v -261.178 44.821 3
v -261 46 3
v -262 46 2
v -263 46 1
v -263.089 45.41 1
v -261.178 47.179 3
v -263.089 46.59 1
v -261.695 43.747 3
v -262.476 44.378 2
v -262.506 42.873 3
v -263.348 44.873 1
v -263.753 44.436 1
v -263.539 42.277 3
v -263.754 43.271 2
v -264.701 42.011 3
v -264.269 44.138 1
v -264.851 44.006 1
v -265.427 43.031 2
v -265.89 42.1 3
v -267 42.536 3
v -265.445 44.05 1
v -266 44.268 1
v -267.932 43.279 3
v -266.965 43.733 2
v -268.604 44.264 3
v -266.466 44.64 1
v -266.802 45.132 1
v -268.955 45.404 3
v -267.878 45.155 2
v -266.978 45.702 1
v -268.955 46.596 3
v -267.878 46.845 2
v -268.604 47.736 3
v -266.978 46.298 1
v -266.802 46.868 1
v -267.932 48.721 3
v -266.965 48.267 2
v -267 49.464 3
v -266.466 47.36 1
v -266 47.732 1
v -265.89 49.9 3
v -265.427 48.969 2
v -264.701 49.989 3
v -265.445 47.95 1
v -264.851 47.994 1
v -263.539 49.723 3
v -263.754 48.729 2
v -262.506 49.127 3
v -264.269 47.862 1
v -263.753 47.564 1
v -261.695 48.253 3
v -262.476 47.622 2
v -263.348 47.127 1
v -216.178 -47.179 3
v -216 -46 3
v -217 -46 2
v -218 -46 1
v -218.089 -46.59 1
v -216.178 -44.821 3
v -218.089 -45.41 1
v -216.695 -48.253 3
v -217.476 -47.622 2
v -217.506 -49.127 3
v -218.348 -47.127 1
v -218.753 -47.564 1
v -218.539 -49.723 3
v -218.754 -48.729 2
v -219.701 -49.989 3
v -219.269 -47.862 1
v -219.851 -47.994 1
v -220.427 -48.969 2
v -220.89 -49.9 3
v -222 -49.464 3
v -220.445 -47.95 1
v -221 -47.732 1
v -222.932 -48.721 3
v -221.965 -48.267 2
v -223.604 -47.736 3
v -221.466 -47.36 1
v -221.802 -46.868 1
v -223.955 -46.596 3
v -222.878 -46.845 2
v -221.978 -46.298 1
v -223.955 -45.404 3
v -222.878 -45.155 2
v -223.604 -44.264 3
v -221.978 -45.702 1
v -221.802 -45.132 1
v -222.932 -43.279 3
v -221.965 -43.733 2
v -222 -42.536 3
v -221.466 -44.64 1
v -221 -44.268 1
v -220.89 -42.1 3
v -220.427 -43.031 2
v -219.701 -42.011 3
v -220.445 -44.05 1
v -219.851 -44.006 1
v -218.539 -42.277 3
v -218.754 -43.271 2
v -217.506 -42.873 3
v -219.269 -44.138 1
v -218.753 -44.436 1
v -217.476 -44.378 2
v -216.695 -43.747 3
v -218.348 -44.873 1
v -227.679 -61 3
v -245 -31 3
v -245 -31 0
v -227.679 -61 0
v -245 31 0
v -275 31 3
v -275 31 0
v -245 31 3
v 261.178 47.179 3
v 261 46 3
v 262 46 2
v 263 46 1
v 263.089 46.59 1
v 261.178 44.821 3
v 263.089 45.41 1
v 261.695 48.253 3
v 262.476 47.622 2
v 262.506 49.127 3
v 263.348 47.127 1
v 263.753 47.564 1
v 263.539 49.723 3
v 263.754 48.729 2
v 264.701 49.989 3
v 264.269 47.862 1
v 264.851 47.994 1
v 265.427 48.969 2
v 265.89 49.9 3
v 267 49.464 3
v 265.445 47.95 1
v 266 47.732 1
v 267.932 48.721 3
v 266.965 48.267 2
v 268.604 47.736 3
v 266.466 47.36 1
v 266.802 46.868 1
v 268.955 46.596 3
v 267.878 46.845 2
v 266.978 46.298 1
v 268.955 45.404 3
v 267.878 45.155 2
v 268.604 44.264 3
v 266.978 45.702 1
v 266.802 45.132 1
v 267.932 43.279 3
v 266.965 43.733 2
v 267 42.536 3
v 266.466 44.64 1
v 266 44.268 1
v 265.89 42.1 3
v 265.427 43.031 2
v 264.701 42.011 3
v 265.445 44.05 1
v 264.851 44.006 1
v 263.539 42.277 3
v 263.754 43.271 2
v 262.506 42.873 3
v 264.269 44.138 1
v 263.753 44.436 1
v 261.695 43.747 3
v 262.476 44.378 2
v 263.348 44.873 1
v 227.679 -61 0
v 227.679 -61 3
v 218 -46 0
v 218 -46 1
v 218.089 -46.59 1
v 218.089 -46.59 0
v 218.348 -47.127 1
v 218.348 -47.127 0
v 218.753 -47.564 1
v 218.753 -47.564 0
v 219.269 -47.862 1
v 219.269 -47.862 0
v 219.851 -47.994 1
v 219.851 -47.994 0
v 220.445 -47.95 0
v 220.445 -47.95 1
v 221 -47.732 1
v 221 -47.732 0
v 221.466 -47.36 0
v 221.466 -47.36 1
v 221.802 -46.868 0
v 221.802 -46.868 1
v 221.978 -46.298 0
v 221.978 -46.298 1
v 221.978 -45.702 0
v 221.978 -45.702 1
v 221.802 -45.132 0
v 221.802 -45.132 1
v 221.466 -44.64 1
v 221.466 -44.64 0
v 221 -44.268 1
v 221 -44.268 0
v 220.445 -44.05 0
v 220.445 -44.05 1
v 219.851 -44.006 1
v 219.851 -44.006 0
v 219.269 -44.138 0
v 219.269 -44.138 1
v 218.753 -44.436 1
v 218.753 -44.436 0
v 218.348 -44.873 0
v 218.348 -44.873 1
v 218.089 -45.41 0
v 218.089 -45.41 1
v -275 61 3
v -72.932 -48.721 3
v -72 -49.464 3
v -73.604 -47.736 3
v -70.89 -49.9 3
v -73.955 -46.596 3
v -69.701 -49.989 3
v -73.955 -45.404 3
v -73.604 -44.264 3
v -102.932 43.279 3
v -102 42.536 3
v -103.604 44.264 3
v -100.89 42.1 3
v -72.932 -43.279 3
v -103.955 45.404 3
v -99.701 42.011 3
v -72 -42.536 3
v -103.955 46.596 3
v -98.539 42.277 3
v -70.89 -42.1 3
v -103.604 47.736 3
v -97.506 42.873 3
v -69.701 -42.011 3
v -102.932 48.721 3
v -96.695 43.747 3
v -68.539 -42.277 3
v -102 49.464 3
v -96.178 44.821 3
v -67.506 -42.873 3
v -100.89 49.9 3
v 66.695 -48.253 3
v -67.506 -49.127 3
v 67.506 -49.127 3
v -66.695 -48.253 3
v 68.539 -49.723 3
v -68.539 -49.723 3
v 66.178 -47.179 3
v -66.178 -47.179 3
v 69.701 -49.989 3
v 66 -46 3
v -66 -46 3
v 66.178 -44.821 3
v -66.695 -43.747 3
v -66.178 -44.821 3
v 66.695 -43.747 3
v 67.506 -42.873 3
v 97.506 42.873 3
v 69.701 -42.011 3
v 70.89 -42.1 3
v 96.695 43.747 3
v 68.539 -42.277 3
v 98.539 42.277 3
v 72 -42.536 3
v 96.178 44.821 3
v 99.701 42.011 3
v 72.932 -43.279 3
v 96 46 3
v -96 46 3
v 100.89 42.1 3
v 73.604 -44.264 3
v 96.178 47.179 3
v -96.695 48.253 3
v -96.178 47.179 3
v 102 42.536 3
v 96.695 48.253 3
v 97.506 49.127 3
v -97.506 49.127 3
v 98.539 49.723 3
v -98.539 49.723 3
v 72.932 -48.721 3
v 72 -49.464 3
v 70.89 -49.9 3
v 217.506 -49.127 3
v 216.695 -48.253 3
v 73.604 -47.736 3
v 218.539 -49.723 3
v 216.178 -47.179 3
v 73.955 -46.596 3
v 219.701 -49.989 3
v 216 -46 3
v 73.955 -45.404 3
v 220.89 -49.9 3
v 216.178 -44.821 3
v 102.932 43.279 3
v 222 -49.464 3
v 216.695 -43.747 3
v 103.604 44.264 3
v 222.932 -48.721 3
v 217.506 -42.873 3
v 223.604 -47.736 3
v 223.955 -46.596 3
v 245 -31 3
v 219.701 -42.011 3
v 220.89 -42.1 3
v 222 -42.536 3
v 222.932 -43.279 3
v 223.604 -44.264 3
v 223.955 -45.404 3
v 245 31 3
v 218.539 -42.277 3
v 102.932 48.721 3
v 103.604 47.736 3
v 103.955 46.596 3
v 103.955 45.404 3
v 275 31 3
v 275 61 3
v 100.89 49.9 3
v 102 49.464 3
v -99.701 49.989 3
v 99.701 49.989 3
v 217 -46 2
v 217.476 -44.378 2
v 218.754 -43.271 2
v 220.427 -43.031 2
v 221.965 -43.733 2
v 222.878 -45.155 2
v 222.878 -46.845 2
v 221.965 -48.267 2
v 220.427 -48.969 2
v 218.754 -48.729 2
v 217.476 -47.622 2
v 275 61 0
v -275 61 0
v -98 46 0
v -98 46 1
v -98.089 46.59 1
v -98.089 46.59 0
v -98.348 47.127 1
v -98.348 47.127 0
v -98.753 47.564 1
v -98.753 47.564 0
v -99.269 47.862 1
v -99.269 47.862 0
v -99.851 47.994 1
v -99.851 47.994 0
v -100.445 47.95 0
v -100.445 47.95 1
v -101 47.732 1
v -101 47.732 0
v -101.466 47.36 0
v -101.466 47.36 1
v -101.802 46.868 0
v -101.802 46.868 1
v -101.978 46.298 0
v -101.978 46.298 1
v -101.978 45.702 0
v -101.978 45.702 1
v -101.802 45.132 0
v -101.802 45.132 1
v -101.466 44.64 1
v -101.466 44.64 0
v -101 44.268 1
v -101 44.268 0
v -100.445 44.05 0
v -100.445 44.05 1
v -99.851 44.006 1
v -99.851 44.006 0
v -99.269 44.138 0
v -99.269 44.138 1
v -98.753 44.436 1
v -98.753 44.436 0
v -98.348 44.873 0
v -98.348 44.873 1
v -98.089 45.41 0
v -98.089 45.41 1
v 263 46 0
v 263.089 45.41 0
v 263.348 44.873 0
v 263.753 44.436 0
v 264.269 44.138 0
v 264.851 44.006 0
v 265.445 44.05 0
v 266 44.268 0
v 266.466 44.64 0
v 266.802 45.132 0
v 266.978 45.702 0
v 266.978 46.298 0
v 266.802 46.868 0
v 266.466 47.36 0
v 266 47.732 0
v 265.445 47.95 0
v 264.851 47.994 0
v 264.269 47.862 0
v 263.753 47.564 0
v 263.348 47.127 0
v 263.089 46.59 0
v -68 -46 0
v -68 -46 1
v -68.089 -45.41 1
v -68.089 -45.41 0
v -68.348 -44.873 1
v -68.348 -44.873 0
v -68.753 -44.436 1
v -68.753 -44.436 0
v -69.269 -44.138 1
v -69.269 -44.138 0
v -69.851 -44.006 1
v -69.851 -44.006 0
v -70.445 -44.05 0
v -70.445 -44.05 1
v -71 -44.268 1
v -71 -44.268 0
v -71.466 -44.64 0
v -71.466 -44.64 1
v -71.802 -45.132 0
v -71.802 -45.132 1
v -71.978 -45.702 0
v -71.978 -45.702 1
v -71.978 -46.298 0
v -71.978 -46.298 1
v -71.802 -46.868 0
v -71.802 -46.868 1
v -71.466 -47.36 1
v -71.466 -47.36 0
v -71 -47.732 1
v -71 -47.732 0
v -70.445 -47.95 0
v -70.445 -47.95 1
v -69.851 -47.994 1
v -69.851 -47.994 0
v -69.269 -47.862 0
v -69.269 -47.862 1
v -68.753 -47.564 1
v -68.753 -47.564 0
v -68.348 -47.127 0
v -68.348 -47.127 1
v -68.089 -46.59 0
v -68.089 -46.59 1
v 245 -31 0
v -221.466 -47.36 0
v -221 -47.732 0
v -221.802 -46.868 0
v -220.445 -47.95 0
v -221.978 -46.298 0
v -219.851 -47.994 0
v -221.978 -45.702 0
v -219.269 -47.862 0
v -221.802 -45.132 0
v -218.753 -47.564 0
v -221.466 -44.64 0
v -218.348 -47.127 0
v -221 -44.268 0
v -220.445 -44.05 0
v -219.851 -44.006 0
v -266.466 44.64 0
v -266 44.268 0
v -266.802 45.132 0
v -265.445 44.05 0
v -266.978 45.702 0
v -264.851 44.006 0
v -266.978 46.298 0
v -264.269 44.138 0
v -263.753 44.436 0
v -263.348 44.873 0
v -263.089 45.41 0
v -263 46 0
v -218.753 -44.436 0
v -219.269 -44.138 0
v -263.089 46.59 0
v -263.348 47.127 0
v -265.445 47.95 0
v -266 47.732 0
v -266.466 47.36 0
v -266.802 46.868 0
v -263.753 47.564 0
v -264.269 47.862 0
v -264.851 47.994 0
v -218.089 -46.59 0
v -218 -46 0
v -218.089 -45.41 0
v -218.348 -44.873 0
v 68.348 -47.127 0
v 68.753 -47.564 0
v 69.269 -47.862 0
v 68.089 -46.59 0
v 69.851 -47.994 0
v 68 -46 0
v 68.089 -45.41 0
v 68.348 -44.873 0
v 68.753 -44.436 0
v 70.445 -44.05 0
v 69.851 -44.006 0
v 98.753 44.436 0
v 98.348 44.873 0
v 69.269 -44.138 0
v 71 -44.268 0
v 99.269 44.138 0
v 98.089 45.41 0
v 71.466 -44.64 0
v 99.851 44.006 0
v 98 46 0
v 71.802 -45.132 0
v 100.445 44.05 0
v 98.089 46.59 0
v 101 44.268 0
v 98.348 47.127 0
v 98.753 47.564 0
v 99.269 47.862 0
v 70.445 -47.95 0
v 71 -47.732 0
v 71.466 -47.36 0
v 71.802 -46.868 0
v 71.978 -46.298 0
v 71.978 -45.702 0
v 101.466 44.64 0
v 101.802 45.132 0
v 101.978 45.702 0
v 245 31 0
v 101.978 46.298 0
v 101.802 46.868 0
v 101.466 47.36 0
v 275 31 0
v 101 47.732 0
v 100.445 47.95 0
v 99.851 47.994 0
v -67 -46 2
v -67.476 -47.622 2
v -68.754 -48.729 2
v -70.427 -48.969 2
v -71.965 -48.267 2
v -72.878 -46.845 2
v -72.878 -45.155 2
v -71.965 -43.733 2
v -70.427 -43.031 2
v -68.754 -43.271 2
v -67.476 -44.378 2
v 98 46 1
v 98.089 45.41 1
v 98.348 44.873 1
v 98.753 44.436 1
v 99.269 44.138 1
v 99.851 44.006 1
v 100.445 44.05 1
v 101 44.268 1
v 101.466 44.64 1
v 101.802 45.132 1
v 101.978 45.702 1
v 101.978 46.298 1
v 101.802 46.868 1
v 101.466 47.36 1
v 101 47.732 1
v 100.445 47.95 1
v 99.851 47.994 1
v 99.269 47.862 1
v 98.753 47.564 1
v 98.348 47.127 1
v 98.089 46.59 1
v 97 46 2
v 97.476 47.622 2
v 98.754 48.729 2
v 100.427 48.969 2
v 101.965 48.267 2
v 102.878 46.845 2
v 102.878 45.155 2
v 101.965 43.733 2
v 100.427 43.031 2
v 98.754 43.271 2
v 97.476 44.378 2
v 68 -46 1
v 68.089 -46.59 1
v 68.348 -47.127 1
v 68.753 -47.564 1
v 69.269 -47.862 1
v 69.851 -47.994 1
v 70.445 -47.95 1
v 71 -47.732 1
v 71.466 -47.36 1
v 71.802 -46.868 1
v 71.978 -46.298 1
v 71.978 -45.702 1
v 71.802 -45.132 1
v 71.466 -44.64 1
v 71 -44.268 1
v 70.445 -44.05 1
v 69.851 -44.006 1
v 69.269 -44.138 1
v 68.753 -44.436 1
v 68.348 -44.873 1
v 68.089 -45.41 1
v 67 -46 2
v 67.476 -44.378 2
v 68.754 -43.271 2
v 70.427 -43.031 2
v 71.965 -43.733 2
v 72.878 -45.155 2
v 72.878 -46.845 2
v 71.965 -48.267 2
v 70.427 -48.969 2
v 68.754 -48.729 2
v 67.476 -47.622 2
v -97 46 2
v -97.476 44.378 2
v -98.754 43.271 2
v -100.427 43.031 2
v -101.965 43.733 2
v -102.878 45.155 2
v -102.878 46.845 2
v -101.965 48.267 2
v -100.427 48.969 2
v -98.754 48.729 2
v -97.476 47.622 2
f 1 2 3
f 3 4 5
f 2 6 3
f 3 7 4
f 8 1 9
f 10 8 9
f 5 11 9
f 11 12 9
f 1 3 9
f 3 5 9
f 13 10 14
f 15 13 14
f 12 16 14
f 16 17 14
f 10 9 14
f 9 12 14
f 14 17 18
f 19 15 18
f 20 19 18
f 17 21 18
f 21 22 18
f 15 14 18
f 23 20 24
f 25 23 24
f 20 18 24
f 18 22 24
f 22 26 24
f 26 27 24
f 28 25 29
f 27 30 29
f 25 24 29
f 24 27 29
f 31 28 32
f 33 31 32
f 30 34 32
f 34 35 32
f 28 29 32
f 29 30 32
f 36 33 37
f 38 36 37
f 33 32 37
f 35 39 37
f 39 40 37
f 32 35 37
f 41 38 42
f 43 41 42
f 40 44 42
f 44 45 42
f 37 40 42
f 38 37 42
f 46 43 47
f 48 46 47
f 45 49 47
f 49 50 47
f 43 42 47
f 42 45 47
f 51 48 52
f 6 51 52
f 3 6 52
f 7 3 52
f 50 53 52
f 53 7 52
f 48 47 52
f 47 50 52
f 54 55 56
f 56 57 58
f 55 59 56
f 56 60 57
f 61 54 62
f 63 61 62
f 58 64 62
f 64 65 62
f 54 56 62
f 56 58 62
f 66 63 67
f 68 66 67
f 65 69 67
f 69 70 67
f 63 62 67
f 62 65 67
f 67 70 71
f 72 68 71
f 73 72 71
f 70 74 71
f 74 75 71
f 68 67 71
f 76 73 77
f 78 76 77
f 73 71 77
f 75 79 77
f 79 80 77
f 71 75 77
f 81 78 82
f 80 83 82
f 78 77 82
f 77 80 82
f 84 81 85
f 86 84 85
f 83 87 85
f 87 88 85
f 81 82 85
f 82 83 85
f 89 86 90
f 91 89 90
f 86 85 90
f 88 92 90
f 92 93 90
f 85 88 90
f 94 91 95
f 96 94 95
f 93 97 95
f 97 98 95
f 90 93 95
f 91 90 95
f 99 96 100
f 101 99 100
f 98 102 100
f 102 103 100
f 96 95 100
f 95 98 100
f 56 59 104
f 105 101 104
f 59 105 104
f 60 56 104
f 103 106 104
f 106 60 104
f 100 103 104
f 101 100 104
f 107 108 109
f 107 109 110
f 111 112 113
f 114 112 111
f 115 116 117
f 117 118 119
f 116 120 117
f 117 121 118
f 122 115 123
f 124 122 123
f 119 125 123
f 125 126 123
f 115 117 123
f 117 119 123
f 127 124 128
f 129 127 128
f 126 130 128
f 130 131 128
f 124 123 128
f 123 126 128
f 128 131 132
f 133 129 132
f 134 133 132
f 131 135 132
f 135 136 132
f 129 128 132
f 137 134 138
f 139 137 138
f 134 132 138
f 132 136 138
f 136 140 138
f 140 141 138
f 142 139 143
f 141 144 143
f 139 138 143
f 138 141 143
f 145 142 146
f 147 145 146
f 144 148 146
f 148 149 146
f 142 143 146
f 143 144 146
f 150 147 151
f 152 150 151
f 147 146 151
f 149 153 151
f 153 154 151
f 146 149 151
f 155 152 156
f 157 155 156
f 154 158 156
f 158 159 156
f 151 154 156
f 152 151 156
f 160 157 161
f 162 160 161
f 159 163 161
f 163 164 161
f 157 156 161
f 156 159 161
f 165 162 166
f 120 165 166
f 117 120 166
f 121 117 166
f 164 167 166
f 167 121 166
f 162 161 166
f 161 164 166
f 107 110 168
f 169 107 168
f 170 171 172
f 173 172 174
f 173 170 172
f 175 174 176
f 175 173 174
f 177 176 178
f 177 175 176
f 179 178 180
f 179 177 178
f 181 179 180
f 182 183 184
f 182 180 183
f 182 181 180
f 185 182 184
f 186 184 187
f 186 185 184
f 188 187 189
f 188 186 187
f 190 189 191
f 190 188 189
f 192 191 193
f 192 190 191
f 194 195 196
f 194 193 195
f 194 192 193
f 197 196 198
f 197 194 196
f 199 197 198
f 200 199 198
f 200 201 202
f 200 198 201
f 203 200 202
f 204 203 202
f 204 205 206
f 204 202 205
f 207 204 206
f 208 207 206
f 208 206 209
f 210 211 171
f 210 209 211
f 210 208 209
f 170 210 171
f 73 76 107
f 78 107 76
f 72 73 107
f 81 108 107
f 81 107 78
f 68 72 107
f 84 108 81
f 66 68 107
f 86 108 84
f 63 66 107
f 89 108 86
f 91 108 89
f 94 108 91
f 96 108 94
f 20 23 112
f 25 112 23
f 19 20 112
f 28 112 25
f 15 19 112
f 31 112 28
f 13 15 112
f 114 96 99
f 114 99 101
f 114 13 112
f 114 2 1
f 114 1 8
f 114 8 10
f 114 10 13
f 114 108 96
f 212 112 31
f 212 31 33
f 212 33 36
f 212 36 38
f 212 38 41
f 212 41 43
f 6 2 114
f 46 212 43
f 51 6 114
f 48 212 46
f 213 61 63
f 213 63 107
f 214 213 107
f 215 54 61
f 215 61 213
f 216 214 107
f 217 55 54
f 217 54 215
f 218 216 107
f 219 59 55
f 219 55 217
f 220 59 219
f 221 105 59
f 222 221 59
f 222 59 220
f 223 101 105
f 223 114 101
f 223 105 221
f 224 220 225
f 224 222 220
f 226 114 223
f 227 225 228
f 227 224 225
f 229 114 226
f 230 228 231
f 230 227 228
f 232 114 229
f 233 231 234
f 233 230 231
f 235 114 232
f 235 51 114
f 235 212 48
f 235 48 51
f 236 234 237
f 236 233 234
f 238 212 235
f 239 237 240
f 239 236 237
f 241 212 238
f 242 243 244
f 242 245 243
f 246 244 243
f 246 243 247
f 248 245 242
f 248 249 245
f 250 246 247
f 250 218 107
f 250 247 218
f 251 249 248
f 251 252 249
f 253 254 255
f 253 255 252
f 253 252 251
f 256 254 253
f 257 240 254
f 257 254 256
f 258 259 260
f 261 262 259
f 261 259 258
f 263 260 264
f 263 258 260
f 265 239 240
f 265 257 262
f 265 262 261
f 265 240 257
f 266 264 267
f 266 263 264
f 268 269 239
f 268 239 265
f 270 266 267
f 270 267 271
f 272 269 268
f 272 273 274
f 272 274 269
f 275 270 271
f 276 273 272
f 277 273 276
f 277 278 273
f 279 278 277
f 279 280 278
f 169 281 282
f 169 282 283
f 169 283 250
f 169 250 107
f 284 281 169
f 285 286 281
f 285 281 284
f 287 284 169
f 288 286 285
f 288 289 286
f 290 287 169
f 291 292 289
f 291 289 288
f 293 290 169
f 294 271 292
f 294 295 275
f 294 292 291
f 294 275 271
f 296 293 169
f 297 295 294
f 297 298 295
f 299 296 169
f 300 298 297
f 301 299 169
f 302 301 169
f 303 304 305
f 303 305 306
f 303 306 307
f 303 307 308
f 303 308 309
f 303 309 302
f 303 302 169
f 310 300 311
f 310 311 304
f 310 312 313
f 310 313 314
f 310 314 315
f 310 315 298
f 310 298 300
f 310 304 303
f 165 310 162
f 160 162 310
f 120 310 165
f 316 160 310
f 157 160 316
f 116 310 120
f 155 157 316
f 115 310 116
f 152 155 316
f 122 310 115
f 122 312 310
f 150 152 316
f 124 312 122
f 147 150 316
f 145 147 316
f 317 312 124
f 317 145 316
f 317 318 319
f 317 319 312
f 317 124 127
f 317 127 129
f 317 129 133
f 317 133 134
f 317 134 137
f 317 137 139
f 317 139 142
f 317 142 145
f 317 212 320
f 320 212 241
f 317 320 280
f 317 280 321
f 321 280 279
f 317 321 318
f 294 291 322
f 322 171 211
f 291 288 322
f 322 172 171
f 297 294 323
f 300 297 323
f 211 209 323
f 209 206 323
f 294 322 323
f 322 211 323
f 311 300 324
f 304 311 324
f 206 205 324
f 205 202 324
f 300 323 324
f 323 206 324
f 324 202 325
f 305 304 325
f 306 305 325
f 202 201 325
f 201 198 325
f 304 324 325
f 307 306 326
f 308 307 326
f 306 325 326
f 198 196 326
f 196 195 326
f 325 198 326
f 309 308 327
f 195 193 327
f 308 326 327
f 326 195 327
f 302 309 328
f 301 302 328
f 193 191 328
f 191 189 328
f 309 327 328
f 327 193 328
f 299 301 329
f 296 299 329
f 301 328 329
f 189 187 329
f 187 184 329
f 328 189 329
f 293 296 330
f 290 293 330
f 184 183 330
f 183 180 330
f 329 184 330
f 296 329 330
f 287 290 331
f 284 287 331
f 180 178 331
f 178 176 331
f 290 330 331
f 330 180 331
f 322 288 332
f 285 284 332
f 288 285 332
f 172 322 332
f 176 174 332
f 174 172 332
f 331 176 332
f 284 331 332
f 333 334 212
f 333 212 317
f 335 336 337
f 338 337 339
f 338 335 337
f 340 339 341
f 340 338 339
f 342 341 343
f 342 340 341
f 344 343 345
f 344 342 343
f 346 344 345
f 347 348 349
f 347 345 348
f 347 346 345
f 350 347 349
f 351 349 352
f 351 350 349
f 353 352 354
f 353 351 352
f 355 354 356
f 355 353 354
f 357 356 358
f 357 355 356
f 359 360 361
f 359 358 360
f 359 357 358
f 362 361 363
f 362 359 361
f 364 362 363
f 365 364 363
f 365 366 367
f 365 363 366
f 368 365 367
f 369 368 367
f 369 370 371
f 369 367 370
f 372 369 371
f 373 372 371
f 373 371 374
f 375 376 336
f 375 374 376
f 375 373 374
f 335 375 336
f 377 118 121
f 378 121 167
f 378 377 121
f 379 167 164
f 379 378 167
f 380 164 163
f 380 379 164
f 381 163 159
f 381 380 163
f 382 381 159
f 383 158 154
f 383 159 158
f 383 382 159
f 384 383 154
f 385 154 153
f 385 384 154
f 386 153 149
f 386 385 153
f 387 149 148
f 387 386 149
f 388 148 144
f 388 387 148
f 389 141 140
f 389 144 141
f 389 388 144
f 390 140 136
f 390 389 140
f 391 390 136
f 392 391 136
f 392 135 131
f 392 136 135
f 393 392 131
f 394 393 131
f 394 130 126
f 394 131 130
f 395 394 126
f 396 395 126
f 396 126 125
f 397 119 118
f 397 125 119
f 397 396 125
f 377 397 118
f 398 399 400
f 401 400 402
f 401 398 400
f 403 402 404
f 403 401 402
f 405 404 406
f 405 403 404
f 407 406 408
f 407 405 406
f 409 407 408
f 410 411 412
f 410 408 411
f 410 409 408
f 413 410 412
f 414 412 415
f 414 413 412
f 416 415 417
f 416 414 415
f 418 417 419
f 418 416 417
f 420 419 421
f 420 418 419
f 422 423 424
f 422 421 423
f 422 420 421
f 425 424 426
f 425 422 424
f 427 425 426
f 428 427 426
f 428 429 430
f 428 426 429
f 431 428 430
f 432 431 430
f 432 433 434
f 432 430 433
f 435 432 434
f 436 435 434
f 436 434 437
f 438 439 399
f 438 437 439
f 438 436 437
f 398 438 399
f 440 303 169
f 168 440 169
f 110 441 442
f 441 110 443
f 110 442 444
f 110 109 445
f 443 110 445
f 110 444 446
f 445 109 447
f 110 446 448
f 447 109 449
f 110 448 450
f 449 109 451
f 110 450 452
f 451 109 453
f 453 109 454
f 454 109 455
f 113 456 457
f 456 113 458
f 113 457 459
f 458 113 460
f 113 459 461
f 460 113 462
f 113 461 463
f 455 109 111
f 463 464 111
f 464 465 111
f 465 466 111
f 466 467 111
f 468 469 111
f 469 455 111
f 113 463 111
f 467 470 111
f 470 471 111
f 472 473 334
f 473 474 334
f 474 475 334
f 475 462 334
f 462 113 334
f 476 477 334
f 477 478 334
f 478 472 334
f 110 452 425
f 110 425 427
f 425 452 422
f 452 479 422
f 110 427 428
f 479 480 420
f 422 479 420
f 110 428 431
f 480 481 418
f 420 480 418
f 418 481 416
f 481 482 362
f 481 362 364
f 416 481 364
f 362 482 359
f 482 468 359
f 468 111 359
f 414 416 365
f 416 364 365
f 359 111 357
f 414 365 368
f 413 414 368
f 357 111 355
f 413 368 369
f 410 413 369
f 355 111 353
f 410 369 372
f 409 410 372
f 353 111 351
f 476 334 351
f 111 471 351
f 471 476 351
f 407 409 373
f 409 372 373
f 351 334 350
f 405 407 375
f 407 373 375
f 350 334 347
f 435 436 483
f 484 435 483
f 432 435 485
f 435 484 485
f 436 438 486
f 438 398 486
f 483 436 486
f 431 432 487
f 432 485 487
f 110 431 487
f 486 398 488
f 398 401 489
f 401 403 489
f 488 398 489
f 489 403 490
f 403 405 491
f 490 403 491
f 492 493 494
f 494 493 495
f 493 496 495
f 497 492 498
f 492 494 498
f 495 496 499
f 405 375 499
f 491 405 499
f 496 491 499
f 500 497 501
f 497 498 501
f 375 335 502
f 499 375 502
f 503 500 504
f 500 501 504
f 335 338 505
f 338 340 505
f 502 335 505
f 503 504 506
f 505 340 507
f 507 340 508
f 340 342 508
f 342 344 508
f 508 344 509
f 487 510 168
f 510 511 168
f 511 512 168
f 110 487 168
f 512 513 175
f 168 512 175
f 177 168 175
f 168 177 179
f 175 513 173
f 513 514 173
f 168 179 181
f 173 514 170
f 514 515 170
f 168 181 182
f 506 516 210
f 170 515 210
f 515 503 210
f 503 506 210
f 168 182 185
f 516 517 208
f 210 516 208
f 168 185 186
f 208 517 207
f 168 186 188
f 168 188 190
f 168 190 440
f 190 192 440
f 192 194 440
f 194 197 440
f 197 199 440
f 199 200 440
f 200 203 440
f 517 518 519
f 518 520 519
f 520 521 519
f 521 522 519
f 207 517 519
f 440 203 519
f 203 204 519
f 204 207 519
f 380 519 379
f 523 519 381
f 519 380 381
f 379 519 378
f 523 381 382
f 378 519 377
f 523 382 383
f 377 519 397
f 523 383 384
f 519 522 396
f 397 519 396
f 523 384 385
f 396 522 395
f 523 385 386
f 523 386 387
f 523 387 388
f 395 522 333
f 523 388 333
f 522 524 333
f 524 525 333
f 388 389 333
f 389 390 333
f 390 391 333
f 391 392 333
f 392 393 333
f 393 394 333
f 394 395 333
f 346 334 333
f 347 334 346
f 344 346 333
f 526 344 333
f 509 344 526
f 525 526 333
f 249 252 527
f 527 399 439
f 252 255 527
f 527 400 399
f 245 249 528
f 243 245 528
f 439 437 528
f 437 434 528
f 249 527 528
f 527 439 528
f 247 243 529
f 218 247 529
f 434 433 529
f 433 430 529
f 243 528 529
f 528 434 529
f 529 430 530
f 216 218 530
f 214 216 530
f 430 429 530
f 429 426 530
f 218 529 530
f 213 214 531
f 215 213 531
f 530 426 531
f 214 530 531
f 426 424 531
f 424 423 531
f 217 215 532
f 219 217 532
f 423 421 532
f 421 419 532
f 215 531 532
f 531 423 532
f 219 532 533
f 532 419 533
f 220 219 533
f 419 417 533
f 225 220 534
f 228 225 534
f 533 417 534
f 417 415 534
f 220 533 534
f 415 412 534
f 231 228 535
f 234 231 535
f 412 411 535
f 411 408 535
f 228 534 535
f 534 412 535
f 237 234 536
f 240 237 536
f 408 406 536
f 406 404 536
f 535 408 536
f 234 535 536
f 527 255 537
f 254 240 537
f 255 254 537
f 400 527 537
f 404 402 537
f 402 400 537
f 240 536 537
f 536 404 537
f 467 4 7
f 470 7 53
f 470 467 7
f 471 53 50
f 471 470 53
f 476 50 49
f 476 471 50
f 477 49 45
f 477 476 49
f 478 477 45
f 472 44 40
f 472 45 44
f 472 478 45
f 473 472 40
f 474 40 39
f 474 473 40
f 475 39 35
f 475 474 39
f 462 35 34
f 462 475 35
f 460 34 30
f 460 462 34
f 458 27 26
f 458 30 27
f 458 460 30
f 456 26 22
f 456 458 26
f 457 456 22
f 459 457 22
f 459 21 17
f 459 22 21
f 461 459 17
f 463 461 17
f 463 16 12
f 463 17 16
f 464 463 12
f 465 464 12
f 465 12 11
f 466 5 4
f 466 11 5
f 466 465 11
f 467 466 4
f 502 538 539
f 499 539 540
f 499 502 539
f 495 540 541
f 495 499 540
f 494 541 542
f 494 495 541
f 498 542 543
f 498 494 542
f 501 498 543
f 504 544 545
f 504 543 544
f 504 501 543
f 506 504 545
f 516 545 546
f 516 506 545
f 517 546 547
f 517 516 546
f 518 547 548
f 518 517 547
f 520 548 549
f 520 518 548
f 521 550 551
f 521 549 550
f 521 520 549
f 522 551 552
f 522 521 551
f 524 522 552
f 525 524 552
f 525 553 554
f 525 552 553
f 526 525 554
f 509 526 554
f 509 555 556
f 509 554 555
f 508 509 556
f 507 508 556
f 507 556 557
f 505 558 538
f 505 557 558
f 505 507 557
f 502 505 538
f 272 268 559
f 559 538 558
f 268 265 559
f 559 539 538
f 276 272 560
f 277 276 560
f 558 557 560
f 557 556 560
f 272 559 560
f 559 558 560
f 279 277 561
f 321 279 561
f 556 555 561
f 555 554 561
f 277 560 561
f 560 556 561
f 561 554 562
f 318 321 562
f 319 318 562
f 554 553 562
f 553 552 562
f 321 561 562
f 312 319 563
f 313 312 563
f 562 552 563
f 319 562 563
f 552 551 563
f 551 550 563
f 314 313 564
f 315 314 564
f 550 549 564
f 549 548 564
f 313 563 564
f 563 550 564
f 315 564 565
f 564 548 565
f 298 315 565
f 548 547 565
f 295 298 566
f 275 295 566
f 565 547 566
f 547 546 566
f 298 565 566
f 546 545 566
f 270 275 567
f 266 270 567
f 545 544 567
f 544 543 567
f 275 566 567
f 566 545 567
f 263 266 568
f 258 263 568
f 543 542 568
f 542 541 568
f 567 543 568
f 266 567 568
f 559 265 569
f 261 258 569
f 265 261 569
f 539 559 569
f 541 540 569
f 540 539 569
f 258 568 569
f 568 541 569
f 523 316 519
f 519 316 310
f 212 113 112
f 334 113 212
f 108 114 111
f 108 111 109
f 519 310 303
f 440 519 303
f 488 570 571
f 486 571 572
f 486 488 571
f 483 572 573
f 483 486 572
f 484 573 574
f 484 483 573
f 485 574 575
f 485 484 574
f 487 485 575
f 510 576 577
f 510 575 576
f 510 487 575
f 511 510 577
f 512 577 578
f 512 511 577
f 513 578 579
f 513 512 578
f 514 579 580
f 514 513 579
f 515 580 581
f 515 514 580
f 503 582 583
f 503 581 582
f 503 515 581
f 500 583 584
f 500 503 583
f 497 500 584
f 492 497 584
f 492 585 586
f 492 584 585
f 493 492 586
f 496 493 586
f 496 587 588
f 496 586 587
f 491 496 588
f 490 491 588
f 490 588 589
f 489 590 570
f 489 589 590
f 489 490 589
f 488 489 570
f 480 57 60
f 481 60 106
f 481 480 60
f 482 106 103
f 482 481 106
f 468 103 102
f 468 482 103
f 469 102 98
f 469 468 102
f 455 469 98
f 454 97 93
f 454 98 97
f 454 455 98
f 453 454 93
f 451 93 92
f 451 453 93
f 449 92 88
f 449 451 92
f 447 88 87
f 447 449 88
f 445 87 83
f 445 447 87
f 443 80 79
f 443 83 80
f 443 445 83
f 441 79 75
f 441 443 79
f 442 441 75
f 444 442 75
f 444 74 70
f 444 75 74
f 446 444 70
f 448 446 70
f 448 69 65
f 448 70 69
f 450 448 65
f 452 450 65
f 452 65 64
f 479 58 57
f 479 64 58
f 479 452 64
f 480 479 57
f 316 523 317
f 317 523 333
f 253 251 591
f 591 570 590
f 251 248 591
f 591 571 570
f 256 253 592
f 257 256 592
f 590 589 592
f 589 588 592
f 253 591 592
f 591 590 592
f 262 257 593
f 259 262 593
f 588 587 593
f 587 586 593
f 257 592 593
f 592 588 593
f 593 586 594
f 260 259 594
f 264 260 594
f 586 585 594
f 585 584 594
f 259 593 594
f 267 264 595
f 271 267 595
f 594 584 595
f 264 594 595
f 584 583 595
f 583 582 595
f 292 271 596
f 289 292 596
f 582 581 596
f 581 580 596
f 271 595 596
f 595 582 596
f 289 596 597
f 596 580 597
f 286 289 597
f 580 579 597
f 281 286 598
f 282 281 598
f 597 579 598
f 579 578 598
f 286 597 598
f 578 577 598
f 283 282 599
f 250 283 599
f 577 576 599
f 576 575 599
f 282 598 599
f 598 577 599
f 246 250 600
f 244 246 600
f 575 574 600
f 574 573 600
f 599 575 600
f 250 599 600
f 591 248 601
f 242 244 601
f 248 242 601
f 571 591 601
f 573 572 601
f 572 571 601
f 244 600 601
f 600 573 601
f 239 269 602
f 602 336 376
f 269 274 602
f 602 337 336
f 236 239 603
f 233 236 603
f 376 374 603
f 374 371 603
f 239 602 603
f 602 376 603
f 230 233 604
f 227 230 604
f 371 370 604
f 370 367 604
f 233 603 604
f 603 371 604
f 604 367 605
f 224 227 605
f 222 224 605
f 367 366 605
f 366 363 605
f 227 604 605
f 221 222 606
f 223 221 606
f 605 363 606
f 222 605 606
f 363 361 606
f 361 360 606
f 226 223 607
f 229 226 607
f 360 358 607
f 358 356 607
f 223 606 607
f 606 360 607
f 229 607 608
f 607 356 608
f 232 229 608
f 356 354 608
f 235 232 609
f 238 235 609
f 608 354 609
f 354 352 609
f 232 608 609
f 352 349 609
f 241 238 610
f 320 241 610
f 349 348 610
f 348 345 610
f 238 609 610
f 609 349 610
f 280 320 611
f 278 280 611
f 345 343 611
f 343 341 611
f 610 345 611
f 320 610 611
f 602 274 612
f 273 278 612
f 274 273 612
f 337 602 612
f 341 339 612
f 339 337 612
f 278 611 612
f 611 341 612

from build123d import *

# Parameters (mm, degrees)
SKETCH_1_W          = 550
SKETCH_1_H          = 122
EXTRUDE_1_DEPTH     = 3
CUT_EXTRUDE_2_DEPTH = 282.700195243
SKETCH_2_R          = 2
CUT_EXTRUDE_1_DEPTH = 10
CHAMFER_1_SIZE      = 2


with BuildPart() as part:
    # 草图1 → 凸台-拉伸1 (new body)
    with BuildSketch(Plane.XY):
        Rectangle(SKETCH_1_W, SKETCH_1_H)
    extrude(amount=EXTRUDE_1_DEPTH)

    # 草图3 → 切除-拉伸2 (cut, through all)
    with BuildSketch(Plane.XY.offset(3)):
        Polygon((-275, 31), (-245, 31), (-245, -31), (-227.679491924, -61), (-275, -61), align=None)
        Polygon((245, -31), (227.679491924, -61), (275, -61), (275, 31), (245, 31), align=None)
    extrude(amount=-CUT_EXTRUDE_2_DEPTH, mode=Mode.SUBTRACT)

    # 草图2 → 切除-拉伸1 (cut)
    with BuildSketch(Plane.XY):
        with Locations((-100, 46)):
            Circle(SKETCH_2_R)
        with Locations((-265, 46)):
            Circle(SKETCH_2_R)
        with Locations(Location((265, 46, 0), (0, 0, 180))):
            Circle(SKETCH_2_R)
        with Locations(Location((100, 46, 0), (0, 0, 180))):
            Circle(SKETCH_2_R)
        with Locations((-220, -46)):
            Circle(SKETCH_2_R)
        with Locations((-70, -46)):
            Circle(SKETCH_2_R)
        with Locations(Location((70, -46, 0), (0, 0, 180))):
            Circle(SKETCH_2_R)
        with Locations(Location((220, -46, 0), (0, 0, 180))):
            Circle(SKETCH_2_R)
    extrude(amount=CUT_EXTRUDE_1_DEPTH, mode=Mode.SUBTRACT)

    # 倒角1
    chamfer_1_edges = [part.edges().sort_by_distance(p)[0] for p in [
        (-222, -46, 3),
        (102, 46, 3),
        (267, 46, 3),
        (-267, 46, 3),
        (-72, -46, 3),
        (72, -46, 3),
        (222, -46, 3),
        (-102, 46, 3),
    ]]
    chamfer(chamfer_1_edges, length=CHAMFER_1_SIZE)


solid = part.part
